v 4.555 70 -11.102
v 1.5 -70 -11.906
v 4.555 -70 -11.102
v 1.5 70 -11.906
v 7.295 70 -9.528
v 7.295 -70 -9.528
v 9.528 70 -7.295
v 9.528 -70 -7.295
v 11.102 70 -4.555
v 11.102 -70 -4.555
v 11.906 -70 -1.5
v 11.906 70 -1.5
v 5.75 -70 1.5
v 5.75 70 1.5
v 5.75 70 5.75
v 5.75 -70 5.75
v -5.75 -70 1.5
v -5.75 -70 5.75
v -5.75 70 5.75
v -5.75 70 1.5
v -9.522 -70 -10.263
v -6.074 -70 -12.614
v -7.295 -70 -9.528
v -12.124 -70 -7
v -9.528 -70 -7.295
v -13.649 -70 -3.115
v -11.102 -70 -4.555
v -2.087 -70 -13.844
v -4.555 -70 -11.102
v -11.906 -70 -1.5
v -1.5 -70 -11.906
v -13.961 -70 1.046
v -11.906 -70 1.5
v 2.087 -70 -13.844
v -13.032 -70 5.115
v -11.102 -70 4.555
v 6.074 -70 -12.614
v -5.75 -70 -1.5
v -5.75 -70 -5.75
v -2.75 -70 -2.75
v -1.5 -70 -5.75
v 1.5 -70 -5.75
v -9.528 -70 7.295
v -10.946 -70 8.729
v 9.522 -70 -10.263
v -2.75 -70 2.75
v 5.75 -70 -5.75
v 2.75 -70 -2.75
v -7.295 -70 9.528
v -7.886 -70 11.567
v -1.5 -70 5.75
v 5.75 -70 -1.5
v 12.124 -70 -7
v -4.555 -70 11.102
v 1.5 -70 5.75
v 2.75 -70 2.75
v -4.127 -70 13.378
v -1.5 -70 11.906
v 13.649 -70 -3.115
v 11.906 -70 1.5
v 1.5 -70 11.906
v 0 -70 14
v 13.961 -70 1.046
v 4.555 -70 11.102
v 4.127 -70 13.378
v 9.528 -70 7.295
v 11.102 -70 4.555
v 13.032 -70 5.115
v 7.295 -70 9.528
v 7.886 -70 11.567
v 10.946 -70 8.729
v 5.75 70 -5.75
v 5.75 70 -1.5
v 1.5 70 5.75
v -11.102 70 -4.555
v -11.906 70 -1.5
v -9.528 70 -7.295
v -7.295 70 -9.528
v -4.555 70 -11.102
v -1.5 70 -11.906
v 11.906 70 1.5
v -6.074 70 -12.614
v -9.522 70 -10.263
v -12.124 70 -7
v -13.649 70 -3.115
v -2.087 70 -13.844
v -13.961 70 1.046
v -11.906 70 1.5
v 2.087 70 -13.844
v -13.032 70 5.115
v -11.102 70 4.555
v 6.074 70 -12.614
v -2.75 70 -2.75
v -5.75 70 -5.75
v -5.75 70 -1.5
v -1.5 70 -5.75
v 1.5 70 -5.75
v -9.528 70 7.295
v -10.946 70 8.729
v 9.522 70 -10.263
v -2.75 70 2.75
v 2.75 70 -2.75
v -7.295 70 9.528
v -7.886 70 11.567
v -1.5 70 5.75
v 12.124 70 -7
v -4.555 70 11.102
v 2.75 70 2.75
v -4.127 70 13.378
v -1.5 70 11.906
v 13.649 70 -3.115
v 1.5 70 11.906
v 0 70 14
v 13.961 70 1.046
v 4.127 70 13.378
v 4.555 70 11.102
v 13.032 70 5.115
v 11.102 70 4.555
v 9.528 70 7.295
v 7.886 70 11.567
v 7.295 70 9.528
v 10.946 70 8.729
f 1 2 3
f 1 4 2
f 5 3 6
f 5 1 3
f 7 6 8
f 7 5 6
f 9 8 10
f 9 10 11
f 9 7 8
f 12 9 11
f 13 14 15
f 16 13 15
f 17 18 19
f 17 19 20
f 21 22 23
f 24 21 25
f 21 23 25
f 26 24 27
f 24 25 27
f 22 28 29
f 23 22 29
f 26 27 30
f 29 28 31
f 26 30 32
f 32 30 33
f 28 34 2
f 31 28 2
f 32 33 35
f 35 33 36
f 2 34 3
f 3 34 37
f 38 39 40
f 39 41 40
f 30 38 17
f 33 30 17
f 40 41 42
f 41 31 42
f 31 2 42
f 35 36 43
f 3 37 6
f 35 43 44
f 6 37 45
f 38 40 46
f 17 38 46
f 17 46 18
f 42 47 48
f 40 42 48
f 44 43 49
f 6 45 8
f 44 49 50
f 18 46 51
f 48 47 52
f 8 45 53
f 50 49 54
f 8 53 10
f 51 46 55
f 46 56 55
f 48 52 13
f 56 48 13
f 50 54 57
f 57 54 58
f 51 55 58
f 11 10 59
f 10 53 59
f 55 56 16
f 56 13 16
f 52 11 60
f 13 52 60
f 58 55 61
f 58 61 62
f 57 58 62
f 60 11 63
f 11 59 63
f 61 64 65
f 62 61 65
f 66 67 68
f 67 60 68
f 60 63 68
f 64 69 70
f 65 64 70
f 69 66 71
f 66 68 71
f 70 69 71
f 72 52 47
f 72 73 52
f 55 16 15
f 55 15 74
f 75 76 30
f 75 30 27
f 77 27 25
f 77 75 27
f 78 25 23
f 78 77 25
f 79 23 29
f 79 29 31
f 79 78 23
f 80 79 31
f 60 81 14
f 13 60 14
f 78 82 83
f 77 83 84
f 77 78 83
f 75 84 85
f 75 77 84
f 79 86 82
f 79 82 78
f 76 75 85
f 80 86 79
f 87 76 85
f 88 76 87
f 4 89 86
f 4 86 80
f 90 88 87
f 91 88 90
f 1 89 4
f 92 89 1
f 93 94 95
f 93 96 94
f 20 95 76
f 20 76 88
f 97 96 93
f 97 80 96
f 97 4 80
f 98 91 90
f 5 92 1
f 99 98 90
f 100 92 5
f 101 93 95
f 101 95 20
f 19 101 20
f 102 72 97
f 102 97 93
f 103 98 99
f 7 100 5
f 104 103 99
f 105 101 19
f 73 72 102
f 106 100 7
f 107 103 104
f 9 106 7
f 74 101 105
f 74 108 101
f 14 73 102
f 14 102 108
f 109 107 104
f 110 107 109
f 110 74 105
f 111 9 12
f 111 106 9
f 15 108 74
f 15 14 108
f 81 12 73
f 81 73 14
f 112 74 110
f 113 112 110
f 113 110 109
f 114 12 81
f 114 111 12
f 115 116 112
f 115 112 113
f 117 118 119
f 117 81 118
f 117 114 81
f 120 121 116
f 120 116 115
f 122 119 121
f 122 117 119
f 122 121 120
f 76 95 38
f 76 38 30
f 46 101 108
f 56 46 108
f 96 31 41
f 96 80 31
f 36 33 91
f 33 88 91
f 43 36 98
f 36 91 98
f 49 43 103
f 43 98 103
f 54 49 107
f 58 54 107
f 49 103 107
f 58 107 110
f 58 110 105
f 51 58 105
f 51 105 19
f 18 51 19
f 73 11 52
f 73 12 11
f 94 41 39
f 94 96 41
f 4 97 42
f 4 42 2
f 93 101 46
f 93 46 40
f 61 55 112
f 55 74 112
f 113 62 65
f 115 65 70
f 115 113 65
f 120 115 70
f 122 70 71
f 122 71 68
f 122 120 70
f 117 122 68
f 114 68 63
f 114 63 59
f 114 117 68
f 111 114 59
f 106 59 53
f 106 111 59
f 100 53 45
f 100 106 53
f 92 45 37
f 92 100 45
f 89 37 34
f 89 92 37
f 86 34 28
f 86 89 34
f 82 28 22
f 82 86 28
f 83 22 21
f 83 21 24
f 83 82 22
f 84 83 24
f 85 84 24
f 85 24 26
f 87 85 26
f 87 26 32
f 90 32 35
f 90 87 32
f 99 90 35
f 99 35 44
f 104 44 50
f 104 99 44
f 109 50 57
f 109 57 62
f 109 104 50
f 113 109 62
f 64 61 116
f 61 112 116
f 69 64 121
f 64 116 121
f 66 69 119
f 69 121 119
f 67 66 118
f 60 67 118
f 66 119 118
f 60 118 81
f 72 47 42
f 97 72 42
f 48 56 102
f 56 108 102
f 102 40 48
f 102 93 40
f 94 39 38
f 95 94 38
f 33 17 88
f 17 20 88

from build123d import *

# Parameters (mm, degrees)
SKETCH1_R  = 14
SKETCH1_W  = 5.5
SKETCH1_H  = 5.5
BODY_DEPTH = 70


with BuildPart() as part:
    # Sketch1 → Body (new, symmetric)
    with BuildSketch(Plane(origin=(0, 0, 0), x_dir=(1, 0, 0), z_dir=(0, 1, 0))):
        with Locations(Location((0, 0, 0), (0, 0, 270))):
            Circle(SKETCH1_R)
        with BuildLine():
            Line((-5.75, 1.5), (-11.9058809, 1.5))
            ThreePointArc((-11.9058809, 1.5), (-8.485281374, 8.485281374), (-1.5, 11.9058809))
            Line((-1.5, 11.9058809), (-1.5, 5.75))
            Line((-1.5, 5.75), (-5.75, 5.75))
            Line((-5.75, 5.75), (-5.75, 1.5))
        make_face(mode=Mode.SUBTRACT)
        with BuildLine():
            Line((5.75, -5.75), (1.5, -5.75))
            Line((1.5, -5.75), (1.5, -11.9058809))
            ThreePointArc((1.5, -11.9058809), (8.485281374, -8.485281374), (11.9058809, -1.5))
            Line((11.9058809, -1.5), (5.75, -1.5))
            Line((5.75, -1.5), (5.75, -5.75))
        make_face(mode=Mode.SUBTRACT)
        with BuildLine():
            Line((5.75, 5.75), (1.5, 5.75))
            Line((1.5, 5.75), (1.5, 11.9058809))
            ThreePointArc((1.5, 11.9058809), (8.485281374, 8.485281374), (11.9058809, 1.5))
            Line((11.9058809, 1.5), (5.75, 1.5))
            Line((5.75, 1.5), (5.75, 5.75))
        make_face(mode=Mode.SUBTRACT)
        with BuildLine():
            Line((-5.75, -5.75), (-5.75, -1.5))
            Line((-5.75, -1.5), (-11.9058809, -1.5))
            ThreePointArc((-11.9058809, -1.5), (-8.485281374, -8.485281374), (-1.5, -11.9058809))
            Line((-1.5, -11.9058809), (-1.5, -5.75))
            Line((-1.5, -5.75), (-5.75, -5.75))
        make_face(mode=Mode.SUBTRACT)
        Rectangle(SKETCH1_W, SKETCH1_H, mode=Mode.SUBTRACT)
    extrude(amount=BODY_DEPTH, both=True)


solid = part.part
